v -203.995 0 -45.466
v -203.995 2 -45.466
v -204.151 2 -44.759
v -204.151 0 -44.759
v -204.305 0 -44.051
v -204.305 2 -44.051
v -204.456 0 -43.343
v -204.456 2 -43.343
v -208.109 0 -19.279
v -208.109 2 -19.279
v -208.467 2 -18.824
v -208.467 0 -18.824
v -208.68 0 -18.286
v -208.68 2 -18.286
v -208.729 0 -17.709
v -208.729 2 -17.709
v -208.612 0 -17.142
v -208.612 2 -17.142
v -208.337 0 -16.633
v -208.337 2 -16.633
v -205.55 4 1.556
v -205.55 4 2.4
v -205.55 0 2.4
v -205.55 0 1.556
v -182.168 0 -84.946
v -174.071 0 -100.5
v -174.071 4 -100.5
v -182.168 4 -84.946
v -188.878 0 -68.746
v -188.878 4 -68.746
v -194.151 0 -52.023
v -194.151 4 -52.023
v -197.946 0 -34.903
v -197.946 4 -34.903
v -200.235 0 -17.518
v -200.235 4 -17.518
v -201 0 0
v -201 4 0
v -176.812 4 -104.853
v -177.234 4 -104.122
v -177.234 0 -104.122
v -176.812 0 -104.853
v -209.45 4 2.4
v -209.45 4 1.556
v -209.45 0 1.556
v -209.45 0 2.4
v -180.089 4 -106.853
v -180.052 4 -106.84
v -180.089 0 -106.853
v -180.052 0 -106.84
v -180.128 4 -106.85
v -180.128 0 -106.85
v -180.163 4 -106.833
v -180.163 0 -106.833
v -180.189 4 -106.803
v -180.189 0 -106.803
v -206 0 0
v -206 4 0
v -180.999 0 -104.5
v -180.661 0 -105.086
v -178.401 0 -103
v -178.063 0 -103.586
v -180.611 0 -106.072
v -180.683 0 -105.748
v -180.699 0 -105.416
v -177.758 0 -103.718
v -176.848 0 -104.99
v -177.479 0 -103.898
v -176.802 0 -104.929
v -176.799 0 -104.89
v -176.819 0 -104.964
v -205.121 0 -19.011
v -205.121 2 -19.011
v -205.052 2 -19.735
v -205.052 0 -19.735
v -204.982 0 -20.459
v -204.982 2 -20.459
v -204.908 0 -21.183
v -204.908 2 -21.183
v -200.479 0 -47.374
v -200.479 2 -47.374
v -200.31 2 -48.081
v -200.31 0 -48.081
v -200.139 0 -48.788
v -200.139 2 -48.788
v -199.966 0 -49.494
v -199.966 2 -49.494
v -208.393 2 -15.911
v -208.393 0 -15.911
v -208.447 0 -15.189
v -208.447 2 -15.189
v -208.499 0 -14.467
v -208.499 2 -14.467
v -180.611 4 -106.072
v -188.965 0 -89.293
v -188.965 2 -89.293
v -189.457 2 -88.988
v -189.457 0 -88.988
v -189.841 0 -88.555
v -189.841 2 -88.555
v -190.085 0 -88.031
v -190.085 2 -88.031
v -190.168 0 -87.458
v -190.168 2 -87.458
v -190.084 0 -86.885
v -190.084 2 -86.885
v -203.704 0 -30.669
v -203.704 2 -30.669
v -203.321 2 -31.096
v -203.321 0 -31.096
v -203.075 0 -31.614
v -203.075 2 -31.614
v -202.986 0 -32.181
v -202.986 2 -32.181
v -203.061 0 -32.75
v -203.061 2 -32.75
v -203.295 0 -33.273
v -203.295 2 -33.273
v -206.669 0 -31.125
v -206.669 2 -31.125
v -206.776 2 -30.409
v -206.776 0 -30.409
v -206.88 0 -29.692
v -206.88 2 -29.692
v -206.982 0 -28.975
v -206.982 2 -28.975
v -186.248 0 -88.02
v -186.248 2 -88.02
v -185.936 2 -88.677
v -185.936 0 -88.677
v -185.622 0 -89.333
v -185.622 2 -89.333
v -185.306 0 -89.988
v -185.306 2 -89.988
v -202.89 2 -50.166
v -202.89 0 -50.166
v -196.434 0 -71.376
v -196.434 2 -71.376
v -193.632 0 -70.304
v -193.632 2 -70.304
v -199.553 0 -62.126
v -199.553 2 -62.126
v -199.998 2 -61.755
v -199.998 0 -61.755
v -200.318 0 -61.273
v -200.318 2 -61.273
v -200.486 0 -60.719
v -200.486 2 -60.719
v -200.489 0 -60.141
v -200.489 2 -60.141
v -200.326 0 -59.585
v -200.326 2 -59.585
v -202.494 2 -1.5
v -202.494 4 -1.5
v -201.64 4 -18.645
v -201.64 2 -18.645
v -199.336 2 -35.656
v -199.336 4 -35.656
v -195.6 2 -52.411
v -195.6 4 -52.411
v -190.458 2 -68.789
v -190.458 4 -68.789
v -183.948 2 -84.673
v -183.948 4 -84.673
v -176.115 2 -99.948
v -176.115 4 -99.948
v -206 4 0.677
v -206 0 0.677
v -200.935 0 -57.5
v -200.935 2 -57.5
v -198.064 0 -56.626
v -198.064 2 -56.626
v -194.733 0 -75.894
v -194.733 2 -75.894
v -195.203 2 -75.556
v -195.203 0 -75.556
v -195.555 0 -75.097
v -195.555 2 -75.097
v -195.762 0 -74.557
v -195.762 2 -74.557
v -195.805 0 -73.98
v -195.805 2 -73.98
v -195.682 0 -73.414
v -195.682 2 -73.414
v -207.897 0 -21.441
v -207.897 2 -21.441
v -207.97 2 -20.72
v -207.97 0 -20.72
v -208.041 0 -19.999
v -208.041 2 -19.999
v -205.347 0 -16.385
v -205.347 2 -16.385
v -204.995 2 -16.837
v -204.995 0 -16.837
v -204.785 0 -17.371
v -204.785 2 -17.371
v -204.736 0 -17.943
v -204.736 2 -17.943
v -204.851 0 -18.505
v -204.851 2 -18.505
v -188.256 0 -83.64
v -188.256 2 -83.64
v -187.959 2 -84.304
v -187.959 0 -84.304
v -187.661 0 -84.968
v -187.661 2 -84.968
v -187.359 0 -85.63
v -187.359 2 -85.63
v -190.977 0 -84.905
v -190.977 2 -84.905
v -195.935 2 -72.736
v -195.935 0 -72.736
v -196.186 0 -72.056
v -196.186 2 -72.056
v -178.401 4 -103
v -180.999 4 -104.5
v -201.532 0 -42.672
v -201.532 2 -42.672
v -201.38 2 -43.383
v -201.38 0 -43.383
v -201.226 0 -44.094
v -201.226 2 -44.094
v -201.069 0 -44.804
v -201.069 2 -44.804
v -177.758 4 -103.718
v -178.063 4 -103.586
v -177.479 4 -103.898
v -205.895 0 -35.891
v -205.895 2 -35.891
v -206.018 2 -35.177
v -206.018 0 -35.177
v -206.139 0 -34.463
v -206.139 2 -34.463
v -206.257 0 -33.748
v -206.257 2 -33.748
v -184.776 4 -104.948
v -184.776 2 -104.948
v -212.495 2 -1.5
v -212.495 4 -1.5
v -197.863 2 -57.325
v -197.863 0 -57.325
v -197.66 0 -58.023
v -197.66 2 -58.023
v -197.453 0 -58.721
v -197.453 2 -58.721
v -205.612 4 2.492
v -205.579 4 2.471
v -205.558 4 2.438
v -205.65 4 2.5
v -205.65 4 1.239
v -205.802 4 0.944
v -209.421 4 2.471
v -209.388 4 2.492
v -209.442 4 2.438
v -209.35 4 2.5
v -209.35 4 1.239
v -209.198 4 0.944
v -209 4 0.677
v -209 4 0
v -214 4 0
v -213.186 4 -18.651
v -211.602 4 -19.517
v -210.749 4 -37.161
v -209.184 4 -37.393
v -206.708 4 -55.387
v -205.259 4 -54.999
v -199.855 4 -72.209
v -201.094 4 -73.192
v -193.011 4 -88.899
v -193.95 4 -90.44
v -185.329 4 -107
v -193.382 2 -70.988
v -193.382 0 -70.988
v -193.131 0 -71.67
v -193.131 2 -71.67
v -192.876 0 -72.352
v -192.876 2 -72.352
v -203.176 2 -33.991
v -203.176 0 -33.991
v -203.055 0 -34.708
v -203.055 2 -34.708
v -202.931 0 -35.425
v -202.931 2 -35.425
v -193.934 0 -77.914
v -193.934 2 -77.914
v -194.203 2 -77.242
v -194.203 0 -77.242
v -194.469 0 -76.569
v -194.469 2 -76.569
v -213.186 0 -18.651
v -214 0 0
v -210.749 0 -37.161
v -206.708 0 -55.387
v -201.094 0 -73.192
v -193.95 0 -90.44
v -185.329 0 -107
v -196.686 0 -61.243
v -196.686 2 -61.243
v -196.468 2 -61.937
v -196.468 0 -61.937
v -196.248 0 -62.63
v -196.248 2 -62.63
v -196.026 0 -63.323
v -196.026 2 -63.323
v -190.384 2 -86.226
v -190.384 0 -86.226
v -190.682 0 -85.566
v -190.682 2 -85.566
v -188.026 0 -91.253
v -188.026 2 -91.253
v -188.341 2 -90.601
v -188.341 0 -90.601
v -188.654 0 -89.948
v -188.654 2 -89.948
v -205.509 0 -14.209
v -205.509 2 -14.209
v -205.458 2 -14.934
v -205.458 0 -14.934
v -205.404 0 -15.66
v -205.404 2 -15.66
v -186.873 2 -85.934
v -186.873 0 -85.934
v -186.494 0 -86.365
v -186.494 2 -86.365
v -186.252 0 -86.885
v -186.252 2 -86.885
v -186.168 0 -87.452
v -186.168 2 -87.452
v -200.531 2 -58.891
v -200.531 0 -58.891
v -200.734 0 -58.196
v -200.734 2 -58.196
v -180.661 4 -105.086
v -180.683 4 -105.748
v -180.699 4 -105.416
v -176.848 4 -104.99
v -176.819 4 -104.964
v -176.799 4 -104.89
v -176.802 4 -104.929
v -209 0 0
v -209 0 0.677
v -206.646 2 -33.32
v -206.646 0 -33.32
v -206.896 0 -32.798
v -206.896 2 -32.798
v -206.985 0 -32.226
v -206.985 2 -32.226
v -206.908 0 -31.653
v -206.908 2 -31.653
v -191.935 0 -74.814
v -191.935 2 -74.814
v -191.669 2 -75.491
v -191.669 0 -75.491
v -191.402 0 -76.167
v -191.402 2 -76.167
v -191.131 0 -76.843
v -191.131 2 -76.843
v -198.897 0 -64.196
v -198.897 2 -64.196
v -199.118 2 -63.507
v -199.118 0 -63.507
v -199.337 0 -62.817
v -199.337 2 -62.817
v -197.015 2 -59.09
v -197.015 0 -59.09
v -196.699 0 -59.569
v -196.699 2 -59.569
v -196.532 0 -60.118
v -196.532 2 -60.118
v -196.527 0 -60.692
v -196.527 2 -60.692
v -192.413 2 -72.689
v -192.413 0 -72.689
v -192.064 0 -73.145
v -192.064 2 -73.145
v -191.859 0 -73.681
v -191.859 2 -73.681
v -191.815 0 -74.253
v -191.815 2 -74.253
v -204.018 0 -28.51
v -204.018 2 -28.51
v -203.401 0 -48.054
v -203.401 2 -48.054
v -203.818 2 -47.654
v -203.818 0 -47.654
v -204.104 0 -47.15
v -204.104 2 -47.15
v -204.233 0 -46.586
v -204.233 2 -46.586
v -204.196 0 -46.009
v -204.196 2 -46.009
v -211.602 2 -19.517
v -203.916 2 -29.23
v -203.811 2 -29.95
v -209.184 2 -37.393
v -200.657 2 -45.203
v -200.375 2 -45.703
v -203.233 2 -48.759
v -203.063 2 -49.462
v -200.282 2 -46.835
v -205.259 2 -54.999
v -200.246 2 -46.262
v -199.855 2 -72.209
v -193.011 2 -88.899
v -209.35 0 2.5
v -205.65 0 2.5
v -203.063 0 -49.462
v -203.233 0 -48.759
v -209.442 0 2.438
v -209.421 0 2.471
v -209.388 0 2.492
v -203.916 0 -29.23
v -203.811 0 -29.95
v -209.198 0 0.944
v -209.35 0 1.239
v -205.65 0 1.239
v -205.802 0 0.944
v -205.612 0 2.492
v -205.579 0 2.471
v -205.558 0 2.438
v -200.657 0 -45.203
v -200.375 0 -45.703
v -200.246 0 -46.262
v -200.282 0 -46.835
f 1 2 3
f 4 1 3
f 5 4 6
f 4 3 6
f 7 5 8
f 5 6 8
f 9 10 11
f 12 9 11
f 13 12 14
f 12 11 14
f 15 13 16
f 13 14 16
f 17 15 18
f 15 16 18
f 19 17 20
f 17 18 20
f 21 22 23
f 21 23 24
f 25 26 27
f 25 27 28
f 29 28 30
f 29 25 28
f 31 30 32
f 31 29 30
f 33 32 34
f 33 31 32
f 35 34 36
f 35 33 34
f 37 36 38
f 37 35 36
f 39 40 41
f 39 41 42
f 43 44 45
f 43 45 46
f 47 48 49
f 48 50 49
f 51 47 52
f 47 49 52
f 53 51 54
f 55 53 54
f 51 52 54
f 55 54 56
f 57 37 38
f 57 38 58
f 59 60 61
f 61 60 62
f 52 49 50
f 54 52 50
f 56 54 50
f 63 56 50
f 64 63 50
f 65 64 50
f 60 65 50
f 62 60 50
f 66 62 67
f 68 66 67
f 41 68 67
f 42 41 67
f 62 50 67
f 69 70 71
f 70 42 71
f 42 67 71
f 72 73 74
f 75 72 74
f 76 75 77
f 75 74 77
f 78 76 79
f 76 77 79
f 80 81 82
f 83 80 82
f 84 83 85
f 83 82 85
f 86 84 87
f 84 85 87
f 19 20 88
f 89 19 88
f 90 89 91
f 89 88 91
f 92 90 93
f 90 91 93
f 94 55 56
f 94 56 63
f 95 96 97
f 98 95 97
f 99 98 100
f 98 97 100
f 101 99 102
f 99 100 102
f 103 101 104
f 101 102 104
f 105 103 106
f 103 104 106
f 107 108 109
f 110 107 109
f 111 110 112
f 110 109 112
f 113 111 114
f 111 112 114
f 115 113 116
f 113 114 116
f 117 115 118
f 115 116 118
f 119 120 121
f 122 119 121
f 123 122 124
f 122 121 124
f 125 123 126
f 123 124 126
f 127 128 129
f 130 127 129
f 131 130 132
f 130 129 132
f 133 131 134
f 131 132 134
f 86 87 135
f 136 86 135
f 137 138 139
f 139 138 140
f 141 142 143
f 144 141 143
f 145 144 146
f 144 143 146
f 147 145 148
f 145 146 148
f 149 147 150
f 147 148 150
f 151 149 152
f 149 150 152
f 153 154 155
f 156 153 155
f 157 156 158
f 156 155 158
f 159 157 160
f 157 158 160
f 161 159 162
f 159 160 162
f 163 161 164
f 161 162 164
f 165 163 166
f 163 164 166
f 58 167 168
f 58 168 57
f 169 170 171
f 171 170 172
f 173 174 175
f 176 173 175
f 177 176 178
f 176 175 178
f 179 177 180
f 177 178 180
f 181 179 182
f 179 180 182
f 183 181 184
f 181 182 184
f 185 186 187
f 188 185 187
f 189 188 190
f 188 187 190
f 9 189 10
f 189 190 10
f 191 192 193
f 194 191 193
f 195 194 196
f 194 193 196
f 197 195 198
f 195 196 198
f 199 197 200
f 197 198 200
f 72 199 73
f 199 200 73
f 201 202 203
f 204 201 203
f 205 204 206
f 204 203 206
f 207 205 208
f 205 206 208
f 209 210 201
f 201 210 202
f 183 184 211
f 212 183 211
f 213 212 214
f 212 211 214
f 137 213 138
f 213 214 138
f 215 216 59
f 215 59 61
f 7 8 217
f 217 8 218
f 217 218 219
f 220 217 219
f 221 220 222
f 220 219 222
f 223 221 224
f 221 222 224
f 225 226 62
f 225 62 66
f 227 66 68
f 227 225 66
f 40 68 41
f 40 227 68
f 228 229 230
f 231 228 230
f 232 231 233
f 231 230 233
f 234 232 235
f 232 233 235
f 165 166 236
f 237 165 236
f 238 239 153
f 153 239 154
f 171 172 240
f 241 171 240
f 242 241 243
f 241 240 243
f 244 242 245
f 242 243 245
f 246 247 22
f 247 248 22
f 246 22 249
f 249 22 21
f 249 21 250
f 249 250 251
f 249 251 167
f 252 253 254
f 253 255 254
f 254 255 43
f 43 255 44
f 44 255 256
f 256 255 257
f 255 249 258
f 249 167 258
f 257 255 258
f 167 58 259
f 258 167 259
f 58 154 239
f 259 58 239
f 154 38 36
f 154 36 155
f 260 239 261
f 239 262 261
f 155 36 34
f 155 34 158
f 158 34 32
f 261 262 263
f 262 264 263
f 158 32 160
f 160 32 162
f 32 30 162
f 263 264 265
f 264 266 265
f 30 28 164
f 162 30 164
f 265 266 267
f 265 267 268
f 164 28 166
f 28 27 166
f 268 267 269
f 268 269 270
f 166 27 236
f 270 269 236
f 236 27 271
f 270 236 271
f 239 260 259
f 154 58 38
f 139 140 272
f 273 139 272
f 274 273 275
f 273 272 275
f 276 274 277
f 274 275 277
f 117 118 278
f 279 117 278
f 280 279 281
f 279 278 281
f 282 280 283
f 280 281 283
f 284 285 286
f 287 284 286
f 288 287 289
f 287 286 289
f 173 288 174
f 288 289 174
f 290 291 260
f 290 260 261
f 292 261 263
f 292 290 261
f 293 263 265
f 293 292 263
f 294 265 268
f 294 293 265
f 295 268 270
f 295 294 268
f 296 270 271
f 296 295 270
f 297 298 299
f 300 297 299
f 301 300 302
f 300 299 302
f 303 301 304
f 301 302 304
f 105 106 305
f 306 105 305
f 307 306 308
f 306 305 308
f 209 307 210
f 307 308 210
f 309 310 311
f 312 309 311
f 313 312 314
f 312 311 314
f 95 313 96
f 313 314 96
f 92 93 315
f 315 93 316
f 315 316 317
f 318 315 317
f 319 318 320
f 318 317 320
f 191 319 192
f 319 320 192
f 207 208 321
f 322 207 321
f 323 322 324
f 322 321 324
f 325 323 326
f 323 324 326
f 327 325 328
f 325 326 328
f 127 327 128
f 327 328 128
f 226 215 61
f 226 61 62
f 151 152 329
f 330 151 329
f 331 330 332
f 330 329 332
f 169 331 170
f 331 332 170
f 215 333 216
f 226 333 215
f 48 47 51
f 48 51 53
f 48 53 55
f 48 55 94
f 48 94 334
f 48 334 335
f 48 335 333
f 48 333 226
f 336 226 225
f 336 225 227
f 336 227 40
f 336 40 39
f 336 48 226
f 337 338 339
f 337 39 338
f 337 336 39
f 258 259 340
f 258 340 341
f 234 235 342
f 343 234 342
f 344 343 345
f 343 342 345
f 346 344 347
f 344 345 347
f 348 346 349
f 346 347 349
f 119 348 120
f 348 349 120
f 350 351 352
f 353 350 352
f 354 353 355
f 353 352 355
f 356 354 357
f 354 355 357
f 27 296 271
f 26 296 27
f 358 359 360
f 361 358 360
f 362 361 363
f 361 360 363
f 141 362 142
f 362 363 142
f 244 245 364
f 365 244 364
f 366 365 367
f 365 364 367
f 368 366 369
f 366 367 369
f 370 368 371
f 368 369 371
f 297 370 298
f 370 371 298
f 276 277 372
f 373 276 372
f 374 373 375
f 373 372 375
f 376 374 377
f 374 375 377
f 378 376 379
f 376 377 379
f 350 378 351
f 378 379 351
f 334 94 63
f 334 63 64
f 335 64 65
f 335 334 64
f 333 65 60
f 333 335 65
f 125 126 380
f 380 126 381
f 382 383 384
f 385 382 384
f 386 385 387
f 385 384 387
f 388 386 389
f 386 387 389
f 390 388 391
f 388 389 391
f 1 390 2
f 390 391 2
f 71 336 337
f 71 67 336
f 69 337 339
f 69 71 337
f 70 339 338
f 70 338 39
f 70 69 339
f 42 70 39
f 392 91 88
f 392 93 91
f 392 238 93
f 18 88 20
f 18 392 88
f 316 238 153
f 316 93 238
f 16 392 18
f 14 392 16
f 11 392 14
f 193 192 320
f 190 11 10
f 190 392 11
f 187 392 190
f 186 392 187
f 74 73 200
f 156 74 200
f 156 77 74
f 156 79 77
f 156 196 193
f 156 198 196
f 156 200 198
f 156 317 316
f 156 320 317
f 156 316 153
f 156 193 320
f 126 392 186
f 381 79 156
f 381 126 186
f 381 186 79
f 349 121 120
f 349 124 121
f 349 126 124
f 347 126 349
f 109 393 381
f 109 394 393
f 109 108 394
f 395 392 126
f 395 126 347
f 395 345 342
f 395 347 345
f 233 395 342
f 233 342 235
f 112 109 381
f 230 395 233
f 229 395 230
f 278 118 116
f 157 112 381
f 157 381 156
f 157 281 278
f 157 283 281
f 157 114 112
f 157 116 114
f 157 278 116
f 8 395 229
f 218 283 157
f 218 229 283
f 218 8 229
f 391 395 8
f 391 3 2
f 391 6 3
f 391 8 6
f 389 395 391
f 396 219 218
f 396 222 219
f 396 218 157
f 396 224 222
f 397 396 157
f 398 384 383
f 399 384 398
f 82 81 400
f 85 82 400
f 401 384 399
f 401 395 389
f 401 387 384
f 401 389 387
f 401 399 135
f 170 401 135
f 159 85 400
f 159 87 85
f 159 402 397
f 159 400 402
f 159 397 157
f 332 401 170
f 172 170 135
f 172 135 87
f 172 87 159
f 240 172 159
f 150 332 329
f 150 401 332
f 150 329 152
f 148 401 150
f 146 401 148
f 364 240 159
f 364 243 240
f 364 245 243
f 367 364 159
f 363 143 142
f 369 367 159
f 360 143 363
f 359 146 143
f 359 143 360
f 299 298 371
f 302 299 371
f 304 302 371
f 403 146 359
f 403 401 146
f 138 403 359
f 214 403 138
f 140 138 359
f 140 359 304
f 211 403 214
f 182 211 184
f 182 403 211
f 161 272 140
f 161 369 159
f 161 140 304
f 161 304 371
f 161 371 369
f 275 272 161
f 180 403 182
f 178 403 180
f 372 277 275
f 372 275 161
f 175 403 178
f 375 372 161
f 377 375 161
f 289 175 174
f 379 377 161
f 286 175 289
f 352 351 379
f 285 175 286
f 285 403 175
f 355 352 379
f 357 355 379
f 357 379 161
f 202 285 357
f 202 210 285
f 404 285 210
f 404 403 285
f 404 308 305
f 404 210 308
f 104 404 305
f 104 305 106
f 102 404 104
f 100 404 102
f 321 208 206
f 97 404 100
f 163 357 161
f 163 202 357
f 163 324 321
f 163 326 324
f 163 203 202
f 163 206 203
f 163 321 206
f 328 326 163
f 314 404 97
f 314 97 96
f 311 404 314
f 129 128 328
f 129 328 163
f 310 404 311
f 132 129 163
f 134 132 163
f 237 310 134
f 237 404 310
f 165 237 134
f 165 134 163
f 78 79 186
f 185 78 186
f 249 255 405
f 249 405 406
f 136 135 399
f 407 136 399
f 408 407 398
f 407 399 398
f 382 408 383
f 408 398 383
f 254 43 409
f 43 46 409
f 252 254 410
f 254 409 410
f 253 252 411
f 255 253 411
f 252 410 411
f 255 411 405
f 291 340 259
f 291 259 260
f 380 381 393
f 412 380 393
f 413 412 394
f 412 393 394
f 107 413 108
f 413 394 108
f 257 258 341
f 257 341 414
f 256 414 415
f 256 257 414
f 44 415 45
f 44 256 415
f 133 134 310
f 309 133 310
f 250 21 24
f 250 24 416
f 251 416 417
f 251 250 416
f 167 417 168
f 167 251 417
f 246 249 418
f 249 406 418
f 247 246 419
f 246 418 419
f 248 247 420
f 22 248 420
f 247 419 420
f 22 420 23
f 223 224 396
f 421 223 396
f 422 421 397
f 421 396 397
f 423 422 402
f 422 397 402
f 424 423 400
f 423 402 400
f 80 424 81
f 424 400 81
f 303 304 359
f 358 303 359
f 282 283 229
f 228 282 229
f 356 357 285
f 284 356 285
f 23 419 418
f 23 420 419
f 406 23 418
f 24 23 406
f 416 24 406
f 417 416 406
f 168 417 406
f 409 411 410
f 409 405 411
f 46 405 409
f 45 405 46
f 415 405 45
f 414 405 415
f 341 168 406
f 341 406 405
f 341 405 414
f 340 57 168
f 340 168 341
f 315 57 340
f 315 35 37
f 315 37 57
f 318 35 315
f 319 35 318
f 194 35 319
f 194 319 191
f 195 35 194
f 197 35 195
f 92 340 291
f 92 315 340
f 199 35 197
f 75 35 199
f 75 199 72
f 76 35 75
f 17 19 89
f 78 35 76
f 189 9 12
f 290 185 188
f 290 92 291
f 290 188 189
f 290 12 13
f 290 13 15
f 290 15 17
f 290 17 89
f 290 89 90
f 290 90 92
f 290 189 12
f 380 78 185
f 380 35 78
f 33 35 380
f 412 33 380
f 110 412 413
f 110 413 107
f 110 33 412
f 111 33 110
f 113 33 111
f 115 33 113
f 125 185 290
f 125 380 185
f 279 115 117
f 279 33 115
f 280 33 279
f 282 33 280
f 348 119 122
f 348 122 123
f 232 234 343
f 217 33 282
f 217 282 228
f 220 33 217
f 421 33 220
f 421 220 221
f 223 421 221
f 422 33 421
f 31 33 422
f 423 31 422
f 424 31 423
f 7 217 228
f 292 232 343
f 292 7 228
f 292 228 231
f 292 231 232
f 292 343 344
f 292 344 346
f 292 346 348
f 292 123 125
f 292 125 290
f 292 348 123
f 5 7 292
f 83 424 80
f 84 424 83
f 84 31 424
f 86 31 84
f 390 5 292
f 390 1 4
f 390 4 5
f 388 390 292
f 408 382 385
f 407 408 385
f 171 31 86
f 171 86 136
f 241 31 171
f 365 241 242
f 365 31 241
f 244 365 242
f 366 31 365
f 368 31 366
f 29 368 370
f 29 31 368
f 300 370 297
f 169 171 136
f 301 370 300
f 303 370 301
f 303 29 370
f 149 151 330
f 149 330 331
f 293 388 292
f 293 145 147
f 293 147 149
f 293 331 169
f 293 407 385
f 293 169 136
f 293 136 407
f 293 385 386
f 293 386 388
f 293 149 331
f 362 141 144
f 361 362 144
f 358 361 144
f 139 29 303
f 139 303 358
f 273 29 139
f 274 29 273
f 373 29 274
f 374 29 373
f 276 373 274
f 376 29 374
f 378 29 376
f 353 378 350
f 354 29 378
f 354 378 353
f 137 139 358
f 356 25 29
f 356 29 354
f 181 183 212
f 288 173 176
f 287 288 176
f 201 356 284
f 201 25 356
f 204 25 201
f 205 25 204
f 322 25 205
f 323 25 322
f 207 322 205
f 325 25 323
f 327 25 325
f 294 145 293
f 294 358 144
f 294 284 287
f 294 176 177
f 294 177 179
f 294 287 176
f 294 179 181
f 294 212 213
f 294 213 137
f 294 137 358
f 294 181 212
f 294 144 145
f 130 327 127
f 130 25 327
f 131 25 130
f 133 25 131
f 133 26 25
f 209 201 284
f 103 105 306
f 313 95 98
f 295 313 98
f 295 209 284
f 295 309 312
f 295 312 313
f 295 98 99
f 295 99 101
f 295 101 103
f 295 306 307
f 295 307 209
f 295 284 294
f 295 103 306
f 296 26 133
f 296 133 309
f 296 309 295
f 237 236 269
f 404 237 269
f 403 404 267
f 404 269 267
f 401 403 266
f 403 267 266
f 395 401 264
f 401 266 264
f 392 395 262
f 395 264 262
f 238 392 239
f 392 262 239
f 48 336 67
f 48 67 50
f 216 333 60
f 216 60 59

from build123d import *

# Parameters (mm, degrees)
EXTRUDE_1_DEPTH          = 4
CUT_EXTRUDE_1_DEPTH      = 2
CUT_EXTRUDE_2_DEPTH      = 2
PATTERN_CIRCULAR_1_COUNT = 3
PATTERN_CIRCULAR_1_ANGLE = 8
PATTERN_CIRCULAR_2_COUNT = 4
PATTERN_CIRCULAR_2_ANGLE = 12
EXTRUDE_2_DEPTH          = 4
EXTRUDE_3_DEPTH          = 4
FILLET_1_R               = 0.1
FILLET_2_R               = 0.1


with BuildPart() as part:
    # 草图1 → 凸台-拉伸1 (new body)
    with BuildSketch(Plane(origin=(0, 0, 0), x_dir=(1, 0, 0), z_dir=(0, 1, 0))):
        with BuildLine():
            Line((-201, 0), (-214, 0))
            ThreePointArc((-214, 0), (-206.708126826, 55.387275652), (-185.32943641, 107))
            Line((-185.32943641, 107), (-174.071106161, 100.5))
            ThreePointArc((-174.071106161, 100.5), (-194.151091084, 52.022628066), (-201, 0))
        make_face()
    extrude(amount=EXTRUDE_1_DEPTH)

    # 草图2 → 切除-拉伸1 (cut)
    with BuildSketch(Plane(origin=(0, 4, 0), x_dir=(1, 0, 0), z_dir=(0, 1, 0))):
        with BuildLine():
            Line((-212.494705816, 1.5), (-202.494444368, 1.5))
            ThreePointArc((-202.494444368, 1.5), (-195.599979824, 52.410856633), (-176.115332948, 99.948184078))
            Line((-176.115332948, 99.948184078), (-184.775813407, 104.948314803))
            ThreePointArc((-184.775813407, 104.948314803), (-205.259238086, 54.999047084), (-212.494705816, 1.5))
        make_face()
    extrude(amount=-CUT_EXTRUDE_1_DEPTH, mode=Mode.SUBTRACT)

    # 草图3 → 切除-拉伸2 (cut)
    with BuildSketch(Plane(origin=(0, 2, 0), x_dir=(1, 0, 0), z_dir=(0, 1, 0))):
        with BuildLine():
            Line((-199.965750312, 49.494431021), (-202.890115075, 50.165737361))
            ThreePointArc((-202.890115075, 50.165737361), (-203.148104938, 49.11056363), (-203.400607182, 48.054063281))
            ThreePointArc((-203.400607182, 48.054063281), (-204.189084459, 46.872889689), (-203.994692232, 45.466092215))
            ThreePointArc((-203.994692232, 45.466092215), (-204.228241354, 44.405241058), (-204.45627368, 43.343190386))
            Line((-204.45627368, 43.343190386), (-201.531908918, 42.671884046))
            ThreePointArc((-201.531908918, 42.671884046), (-201.303079779, 43.738656489), (-201.068603917, 44.804202024))
            ThreePointArc((-201.068603917, 44.804202024), (-200.290486188, 45.977941915), (-200.478798091, 47.37353181))
            ThreePointArc((-200.478798091, 47.37353181), (-200.225082444, 48.434660732), (-199.965750312, 49.494431021))
        make_face()
    cut_extrude_2 = extrude(amount=-CUT_EXTRUDE_2_DEPTH, mode=Mode.SUBTRACT)

    # 阵列(圆周)1: 切除-拉伸2 ×3 about axis
    pattern_circular_1_axis = Axis((0, 0, 0), (0, 1, 0))
    for i in range(1, PATTERN_CIRCULAR_1_COUNT):
        add(cut_extrude_2.rotate(pattern_circular_1_axis, i * PATTERN_CIRCULAR_1_ANGLE / (PATTERN_CIRCULAR_1_COUNT - 1)), mode=Mode.SUBTRACT)

    # 阵列(圆周)2: 切除-拉伸2 ×4 about axis
    pattern_circular_2_axis = Axis((0, 0, 0), (0, -1, 0))
    for i in range(1, PATTERN_CIRCULAR_2_COUNT):
        add(cut_extrude_2.rotate(pattern_circular_2_axis, i * PATTERN_CIRCULAR_2_ANGLE / (PATTERN_CIRCULAR_2_COUNT - 1)), mode=Mode.SUBTRACT)

    # 草图5 → 凸台-拉伸3 (add)
    with BuildSketch(Plane(origin=(0, 4, 0), x_dir=(1, 0, 0), z_dir=(0, 1, 0))):
        with BuildLine():
            Line((-206, 0), (-209, 0))
            Line((-209, 0), (-209, -0.677124344))
            ThreePointArc((-209, -0.677124344), (-209.280042303, -1.088161527), (-209.45, -1.555590279))
            Line((-209.45, -1.555590279), (-209.45, -2.5))
            Line((-209.45, -2.5), (-205.55, -2.5))
            Line((-205.55, -2.5), (-205.55, -1.555590279))
            ThreePointArc((-205.55, -1.555590279), (-205.719957697, -1.088161527), (-206, -0.677124344))
            Line((-206, -0.677124344), (-206, 0))
        make_face()
    extrude(amount=-EXTRUDE_3_DEPTH)

    # 圆角2
    fillet_2_edges = [part.edges().sort_by_distance(p)[0] for p in [
        (-205.55, 2, 2.5),
        (-209.45, 2, 2.5),
    ]]
    fillet(fillet_2_edges, radius=FILLET_2_R)


with BuildPart() as body_2:
    # 草图4 → 凸台-拉伸2 (new body)
    with BuildSketch(Plane(origin=(0, 4, 0), x_dir=(1, 0, 0), z_dir=(0, 1, 0))):
        with BuildLine():
            Line((-176.761521748, 104.940063509), (-180.139020823, 106.890063509))
            Line((-180.139020823, 106.890063509), (-180.611225683, 106.0721807))
            ThreePointArc((-180.611225683, 106.0721807), (-180.697752376, 105.582396677), (-180.660747219, 105.086406884))
            Line((-180.660747219, 105.086406884), (-180.999309391, 104.5))
            Line((-180.999309391, 104.5), (-178.40123318, 103))
            Line((-178.40123318, 103), (-178.062671007, 103.586406884))
            ThreePointArc((-178.062671007, 103.586406884), (-177.614628668, 103.802354375), (-177.233726608, 104.1221807))
            Line((-177.233726608, 104.1221807), (-176.761521748, 104.940063509))
        make_face()
    extrude(amount=-EXTRUDE_2_DEPTH)

    # 圆角1
    fillet_1_edges = [body_2.edges().sort_by_distance(p)[0] for p in [
        (-180.139020823, 2, -106.890063509),
        (-176.761521748, 2, -104.940063509),
    ]]
    fillet(fillet_1_edges, radius=FILLET_1_R)


solid = Compound([part.part, body_2.part])
